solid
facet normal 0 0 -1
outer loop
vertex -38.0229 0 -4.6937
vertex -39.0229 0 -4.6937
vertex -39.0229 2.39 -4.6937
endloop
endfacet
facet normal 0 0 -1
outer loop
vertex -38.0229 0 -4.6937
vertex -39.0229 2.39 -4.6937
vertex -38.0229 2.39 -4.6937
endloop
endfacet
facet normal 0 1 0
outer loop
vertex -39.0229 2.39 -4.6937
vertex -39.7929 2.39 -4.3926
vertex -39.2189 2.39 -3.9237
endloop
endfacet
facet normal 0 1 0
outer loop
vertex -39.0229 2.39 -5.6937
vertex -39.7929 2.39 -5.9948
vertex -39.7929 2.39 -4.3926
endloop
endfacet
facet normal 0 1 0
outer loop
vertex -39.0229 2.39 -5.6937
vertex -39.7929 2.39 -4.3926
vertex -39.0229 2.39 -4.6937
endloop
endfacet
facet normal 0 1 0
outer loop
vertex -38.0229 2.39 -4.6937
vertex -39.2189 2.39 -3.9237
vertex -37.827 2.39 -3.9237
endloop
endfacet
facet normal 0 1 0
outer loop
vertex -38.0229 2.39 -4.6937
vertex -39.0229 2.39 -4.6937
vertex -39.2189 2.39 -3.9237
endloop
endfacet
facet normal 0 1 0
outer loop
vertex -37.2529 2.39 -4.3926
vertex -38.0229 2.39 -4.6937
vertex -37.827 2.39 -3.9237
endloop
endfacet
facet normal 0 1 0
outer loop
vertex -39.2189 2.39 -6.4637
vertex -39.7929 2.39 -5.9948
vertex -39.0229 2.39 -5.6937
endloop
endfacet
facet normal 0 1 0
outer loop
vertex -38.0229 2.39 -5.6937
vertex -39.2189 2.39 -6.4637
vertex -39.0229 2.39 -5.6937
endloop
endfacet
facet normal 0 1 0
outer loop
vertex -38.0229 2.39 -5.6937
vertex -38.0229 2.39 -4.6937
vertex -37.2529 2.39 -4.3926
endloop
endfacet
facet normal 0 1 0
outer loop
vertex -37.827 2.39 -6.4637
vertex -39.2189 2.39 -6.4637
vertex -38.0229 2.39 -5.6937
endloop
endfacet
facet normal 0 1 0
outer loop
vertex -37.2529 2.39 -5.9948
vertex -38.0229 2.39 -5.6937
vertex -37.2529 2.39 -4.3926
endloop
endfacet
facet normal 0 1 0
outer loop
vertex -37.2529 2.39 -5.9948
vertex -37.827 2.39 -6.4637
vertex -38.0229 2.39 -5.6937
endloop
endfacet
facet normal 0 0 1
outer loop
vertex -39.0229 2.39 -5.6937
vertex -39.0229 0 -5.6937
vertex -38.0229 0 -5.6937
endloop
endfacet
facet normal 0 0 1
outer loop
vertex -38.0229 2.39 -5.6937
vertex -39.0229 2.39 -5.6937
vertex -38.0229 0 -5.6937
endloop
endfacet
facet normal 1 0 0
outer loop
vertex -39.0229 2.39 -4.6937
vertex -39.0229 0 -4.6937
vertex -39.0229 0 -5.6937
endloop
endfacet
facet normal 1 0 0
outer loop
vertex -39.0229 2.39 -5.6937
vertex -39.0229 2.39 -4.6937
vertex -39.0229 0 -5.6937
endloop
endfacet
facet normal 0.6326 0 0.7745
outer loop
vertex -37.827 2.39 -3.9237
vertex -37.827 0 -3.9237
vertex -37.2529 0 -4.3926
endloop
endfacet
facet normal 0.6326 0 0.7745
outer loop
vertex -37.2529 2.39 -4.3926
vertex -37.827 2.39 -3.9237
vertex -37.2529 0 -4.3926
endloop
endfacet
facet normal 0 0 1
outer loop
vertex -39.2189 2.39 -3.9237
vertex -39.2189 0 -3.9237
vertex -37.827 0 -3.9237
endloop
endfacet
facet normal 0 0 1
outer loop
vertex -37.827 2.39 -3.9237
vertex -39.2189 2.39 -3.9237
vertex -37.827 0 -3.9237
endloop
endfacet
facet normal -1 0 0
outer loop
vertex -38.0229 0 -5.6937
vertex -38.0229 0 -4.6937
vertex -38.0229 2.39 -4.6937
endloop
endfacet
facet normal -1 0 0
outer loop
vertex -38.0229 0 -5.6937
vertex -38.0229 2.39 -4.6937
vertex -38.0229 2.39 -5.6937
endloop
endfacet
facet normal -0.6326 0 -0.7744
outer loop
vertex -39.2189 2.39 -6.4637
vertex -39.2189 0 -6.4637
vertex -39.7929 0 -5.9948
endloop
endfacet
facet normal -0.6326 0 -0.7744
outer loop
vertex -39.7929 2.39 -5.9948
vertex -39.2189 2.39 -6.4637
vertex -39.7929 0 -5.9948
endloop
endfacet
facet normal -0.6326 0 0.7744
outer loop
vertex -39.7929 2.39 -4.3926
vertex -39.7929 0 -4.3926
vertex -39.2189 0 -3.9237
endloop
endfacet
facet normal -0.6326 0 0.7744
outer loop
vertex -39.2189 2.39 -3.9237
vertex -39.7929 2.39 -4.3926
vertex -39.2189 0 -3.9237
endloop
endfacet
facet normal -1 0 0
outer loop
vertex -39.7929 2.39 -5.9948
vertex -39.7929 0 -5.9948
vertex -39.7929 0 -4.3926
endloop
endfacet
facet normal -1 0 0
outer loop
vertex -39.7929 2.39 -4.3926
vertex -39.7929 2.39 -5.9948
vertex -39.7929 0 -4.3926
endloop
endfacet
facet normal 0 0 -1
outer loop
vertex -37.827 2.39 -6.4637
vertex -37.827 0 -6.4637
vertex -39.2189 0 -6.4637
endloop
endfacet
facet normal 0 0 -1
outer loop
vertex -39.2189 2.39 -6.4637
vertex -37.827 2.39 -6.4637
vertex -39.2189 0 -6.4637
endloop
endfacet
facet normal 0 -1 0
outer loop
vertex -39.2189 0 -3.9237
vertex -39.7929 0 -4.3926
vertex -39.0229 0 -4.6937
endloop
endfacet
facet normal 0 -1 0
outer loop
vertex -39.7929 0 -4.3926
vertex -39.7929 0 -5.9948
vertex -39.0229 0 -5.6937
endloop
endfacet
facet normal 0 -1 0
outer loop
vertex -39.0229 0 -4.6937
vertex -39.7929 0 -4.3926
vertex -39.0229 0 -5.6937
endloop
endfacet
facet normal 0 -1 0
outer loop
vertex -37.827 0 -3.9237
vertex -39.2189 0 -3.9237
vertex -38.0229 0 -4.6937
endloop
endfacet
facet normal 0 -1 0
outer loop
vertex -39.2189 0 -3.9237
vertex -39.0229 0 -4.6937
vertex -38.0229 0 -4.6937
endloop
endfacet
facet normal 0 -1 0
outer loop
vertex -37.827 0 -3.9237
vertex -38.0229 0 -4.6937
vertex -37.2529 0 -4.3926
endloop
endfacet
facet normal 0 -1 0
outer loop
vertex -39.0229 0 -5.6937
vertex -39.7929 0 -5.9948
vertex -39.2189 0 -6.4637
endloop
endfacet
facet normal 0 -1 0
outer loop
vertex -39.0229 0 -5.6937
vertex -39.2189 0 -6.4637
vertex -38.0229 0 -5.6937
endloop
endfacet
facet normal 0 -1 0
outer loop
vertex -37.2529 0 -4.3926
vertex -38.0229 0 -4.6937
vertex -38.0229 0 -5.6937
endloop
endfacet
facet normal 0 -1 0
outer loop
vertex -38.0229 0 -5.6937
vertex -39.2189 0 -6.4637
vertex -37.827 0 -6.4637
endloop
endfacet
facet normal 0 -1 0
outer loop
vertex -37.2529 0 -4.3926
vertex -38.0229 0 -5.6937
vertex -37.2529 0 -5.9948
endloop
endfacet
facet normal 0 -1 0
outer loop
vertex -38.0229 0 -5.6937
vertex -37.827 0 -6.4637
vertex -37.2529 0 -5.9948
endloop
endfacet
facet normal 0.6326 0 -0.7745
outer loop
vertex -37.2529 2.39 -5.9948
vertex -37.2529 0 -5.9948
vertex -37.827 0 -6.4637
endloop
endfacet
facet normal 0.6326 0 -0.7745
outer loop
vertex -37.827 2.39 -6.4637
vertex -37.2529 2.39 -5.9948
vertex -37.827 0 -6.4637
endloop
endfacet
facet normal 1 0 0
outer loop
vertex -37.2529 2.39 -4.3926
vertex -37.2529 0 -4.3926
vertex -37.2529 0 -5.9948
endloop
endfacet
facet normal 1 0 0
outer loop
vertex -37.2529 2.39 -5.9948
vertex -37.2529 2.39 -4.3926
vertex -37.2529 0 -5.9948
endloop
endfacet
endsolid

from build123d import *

# Parameters (mm, degrees)
SKETCH1_W           = 1
SKETCH1_H           = 1
BOSS_EXTRUDE2_DEPTH = 2.39


with BuildPart() as part:
    # Sketch1 → Boss-Extrude2 (new body)
    with BuildSketch(Plane(origin=(0, 0, 0), x_dir=(1, 0, 0), z_dir=(0, 1, 0))):
        Polygon((-39.218854462, 3.923726072), (-37.826970459, 3.923726072), (-37.252912461, 4.392648439), (-37.252912461, 5.994803705), (-37.826970459, 6.463726072), (-39.218854462, 6.463726072), (-39.792912461, 5.994803705), (-39.792912461, 4.392648439), align=None)
        with Locations((-38.522912461, 5.193726072)):
            Rectangle(SKETCH1_W, SKETCH1_H, mode=Mode.SUBTRACT)
    extrude(amount=BOSS_EXTRUDE2_DEPTH)


solid = part.part
